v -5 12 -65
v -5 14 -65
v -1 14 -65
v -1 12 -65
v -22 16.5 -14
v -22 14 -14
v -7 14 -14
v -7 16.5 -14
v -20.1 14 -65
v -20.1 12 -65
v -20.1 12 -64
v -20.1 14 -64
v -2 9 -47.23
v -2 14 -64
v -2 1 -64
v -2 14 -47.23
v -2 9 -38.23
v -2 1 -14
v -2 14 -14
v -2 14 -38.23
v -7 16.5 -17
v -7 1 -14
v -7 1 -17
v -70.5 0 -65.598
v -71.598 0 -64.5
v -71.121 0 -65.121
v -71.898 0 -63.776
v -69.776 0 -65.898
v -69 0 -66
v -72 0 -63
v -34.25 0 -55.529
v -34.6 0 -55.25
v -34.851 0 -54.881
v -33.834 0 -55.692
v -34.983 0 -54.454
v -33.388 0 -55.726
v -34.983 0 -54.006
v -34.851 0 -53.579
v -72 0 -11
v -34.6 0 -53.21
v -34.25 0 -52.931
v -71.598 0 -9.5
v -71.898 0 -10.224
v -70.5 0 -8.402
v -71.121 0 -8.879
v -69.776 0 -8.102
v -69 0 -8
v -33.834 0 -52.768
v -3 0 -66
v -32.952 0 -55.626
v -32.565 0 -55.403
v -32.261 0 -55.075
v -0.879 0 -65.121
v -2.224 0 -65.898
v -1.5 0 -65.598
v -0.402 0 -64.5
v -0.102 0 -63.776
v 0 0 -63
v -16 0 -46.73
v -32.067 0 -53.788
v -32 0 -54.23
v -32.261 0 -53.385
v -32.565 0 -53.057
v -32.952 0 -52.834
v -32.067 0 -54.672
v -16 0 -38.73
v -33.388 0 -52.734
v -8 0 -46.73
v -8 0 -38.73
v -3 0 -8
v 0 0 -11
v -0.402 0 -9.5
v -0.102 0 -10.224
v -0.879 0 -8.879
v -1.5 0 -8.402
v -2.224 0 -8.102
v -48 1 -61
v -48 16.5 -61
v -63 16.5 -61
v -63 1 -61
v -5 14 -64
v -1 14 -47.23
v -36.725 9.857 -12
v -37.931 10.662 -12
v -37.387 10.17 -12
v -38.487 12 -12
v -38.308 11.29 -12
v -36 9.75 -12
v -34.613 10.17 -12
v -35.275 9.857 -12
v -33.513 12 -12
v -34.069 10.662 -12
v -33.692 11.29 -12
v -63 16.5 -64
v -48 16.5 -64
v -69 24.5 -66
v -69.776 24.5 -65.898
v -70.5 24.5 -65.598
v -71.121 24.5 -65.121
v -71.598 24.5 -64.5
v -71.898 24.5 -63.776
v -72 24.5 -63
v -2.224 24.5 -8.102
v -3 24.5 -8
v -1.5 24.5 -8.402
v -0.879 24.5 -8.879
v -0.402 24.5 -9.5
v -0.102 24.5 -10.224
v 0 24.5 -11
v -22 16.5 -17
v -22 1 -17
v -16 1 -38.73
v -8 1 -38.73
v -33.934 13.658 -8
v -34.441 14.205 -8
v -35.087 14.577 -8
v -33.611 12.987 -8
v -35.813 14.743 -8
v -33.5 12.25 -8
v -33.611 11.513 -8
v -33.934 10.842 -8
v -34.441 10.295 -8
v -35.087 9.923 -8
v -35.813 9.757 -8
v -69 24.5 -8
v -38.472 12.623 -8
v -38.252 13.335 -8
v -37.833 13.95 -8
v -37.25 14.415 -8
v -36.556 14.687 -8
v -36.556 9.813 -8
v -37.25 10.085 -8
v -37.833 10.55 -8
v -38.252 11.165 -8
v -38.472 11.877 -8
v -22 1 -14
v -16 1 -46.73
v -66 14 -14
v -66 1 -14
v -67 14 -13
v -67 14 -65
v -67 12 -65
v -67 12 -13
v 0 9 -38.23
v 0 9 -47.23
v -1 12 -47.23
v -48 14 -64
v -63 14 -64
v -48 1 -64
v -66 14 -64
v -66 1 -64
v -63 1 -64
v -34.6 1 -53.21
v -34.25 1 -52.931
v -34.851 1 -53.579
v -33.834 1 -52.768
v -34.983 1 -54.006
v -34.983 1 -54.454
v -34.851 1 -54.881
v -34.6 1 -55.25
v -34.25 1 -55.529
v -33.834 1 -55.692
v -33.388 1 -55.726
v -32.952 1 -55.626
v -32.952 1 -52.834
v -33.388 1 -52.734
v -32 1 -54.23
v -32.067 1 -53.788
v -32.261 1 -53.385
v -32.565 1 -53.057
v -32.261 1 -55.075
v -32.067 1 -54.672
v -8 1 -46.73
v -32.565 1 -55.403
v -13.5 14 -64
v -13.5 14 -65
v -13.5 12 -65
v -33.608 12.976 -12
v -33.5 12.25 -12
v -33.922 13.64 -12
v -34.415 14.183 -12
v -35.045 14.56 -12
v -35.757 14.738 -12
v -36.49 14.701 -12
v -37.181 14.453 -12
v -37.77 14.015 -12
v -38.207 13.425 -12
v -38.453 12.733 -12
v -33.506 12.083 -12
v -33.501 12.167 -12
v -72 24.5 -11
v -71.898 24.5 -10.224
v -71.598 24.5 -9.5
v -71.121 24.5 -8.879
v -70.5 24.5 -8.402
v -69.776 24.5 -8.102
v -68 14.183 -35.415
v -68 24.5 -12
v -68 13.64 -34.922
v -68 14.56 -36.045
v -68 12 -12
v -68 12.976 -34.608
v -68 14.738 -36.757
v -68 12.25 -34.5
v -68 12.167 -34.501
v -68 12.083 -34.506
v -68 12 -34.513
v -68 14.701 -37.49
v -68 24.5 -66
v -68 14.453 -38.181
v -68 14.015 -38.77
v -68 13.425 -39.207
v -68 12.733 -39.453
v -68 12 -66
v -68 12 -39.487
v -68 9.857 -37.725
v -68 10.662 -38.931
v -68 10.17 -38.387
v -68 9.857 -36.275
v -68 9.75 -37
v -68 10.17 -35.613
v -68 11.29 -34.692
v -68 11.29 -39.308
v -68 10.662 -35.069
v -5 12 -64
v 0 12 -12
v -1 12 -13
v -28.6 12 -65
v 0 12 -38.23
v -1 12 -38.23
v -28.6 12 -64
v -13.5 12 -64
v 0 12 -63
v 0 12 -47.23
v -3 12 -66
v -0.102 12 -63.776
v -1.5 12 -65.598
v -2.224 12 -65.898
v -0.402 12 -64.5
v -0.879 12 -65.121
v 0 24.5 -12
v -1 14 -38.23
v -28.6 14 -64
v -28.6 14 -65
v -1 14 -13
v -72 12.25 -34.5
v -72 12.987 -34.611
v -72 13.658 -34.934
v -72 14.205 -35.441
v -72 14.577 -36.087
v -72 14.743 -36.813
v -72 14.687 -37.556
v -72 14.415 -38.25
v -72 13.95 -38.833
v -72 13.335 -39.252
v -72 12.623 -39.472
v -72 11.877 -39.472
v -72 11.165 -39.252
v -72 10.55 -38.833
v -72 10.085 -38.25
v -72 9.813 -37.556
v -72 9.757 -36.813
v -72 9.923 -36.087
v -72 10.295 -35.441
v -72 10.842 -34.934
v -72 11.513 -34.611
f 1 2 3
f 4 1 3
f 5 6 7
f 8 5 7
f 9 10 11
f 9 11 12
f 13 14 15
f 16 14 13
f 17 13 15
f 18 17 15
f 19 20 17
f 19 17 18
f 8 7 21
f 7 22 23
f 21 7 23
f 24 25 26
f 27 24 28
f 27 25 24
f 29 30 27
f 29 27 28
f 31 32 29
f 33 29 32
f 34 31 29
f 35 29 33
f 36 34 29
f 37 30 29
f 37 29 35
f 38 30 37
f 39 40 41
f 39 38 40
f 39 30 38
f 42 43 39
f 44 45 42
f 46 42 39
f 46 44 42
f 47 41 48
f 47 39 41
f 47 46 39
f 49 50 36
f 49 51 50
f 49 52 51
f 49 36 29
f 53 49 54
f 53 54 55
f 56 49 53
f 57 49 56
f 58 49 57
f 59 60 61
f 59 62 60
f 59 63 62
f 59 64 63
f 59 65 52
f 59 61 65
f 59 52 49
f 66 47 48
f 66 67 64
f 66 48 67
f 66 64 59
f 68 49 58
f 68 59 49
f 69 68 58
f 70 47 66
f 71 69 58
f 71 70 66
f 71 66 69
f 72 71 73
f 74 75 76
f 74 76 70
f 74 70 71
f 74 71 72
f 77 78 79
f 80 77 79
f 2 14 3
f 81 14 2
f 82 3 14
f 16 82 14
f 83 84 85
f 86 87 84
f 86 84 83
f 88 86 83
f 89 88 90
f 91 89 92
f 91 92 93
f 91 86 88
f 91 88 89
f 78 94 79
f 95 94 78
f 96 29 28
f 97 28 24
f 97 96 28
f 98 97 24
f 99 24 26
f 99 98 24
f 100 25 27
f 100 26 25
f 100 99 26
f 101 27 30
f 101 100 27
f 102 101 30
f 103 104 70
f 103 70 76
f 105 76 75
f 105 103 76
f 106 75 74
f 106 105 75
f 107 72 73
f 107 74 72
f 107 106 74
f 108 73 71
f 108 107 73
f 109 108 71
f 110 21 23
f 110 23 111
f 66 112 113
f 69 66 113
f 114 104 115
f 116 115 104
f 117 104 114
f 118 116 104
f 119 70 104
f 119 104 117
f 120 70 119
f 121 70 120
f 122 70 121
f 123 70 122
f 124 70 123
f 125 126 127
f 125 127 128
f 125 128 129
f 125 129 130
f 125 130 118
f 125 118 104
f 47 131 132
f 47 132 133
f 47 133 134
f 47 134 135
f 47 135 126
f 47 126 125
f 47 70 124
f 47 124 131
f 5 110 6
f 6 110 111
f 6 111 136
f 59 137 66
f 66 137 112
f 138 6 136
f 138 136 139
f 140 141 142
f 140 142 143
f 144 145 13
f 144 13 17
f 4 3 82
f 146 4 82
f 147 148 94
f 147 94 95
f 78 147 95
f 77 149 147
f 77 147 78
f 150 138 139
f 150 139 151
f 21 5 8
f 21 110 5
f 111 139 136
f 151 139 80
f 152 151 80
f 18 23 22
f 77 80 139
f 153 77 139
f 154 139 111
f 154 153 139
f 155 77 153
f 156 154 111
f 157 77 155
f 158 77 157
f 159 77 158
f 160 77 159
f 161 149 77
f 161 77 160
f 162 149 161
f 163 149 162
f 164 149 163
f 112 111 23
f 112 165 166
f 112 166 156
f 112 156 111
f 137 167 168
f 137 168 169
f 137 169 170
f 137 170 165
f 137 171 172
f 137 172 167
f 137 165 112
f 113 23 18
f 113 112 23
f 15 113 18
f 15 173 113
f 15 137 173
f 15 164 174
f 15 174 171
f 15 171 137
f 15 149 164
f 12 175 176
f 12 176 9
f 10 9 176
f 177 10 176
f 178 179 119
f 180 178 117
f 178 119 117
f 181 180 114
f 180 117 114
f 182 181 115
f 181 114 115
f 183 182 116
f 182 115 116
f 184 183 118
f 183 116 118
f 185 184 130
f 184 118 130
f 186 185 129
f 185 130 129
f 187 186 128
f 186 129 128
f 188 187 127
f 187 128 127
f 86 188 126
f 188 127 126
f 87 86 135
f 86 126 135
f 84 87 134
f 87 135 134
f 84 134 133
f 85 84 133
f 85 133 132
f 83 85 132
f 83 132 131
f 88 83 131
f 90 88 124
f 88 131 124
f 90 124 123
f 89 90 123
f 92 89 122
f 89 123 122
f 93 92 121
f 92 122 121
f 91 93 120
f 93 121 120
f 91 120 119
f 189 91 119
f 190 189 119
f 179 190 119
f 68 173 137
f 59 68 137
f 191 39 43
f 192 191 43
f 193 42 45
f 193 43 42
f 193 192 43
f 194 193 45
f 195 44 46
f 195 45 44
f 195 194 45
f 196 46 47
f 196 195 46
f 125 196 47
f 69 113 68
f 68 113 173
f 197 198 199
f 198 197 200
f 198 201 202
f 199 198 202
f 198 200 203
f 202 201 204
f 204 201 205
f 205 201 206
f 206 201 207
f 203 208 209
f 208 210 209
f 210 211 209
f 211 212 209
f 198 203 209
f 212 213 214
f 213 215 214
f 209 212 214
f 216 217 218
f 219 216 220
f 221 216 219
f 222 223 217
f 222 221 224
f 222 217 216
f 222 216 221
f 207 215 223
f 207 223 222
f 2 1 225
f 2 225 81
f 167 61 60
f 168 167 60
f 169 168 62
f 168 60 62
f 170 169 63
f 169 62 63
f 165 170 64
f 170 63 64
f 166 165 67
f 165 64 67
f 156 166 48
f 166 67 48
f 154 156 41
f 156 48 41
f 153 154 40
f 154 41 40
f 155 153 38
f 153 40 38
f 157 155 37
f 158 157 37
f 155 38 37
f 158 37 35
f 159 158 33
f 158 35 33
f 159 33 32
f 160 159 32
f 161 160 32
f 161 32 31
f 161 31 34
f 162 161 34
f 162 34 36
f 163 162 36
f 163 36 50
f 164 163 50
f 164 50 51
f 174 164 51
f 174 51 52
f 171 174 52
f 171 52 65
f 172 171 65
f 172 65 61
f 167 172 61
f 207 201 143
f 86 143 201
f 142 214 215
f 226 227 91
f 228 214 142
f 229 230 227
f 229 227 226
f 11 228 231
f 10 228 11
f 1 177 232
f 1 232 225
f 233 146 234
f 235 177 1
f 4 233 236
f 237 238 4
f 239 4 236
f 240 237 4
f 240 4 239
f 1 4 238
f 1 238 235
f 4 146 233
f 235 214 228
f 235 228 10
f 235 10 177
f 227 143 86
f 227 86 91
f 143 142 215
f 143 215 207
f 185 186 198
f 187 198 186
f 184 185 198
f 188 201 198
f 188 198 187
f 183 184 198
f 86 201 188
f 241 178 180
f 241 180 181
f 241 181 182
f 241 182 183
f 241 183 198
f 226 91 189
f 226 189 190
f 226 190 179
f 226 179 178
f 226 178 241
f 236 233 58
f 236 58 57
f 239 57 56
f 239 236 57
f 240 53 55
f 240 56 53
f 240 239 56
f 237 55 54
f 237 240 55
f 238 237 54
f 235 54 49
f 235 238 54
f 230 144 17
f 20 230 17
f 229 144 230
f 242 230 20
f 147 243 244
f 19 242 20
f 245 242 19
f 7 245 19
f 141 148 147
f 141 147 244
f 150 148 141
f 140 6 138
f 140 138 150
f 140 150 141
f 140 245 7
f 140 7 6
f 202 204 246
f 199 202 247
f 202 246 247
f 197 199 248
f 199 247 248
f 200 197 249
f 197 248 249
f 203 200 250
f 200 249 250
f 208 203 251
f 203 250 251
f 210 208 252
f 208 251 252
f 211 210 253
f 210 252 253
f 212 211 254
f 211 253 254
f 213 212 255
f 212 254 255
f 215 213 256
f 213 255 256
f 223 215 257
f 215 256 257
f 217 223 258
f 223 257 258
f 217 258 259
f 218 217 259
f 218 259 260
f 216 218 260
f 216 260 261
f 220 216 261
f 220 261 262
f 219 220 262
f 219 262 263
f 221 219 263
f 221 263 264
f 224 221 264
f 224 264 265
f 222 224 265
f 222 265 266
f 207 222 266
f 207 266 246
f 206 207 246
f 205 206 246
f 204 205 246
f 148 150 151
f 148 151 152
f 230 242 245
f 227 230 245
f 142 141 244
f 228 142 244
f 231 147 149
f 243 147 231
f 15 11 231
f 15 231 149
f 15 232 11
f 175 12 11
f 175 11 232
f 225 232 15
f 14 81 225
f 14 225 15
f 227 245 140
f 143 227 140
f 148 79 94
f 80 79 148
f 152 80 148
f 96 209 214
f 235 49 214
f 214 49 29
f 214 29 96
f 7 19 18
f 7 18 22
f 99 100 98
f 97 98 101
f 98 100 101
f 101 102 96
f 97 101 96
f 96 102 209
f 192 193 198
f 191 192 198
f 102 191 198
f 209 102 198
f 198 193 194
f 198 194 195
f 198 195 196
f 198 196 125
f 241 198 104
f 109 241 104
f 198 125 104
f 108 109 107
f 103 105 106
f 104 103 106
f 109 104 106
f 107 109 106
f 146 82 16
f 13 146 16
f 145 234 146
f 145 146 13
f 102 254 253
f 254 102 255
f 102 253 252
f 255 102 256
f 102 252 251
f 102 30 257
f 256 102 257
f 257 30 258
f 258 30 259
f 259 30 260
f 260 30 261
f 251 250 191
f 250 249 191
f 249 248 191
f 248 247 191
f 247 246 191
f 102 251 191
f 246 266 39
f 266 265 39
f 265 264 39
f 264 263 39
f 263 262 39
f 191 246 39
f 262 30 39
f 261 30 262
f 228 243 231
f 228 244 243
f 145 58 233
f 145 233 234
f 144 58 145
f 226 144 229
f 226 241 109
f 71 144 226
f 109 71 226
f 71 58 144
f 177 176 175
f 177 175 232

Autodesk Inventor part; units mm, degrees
ref_plane "YZ Plane" through (0, 0, 0) normal (1, 0, 0) x (0, 1, 0)
ref_plane "XZ Plane" through (0, 0, 0) normal (0, 1, 0) x (-1, 0, 0)
ref_plane "XY Plane" through (0, 0, 0) normal (0, 0, 1) x (1, 0, 0)
sketch "Sketch1" plane through (0, 0, 0) normal (0, 1, 0) x (-1, 0, 0)
  point P0 (0, 0)
sketch "Sketch2" plane through (0, 0, 0) normal (0, 1, 0) x (-1, 0, 0)
  line L0 (68, -12) -> (68, -66)
  line L1 (68, -66) -> (0, -66)
  line L2 (0, -66) -> (0, -12)
  line L3 (68, -12) -> (0, -12)
  point P0 (0, 0)
  dimension "d0" = 68
  dimension "d138" = 54
extrude "Extrusion1" add sketch "Sketch2" along normal blind 14
sketch "Sketch3" plane through (0, 14, 0) normal (0, 1, 0) x (1, 0, 0)
  point P0 (-68, 66)
sketch "Sketch4" plane through (0, 14, 0) normal (0, 1, 0) x (1, 0, 0)
  line L0 (0, 66) -> (-68, 66) projected
  line L1 (-30.4814, 66) -> (-28.4814, 66)
  line L2 (-28.4814, 66) -> (-28.4814, 64)
  line L3 (-68, 66) -> (-68, 12) projected
  line L4 (-68, 37.8423) -> (-68, 39.8423)
  line L5 (-68, 39.8423) -> (-66, 39.8423)
  line L6 (0, 38.8423) -> (0, 36.8423)
  line L7 (0, 36.8423) -> (-2, 36.8423)
  line L8 (-66, 64) -> (-2, 64)
  line L9 (-2, 64) -> (-2, 14)
  line L10 (-2, 14) -> (-66, 14)
  line L11 (-66, 14) -> (-66, 64)
  dimension "d5" = 2
  dimension "d6" = 2
  dimension "d7" = 2
  dimension "d11" = 2
  dimension "d75" = 2
  dimension "d132" = 50
  dimension "d133" = 64
extrude "Extrusion2" cut sketch "Sketch4" against normal blind 13 contours L8 L9 L10 L11
sketch "Sketch7" plane through (0, 14, 0) normal (0, 1, 0) x (1, 0, 0)
  line L0 (-68, 66) -> (-67, 66)
  line L1 (-68, 66) -> (-6, 66)
  line L2 (-68, 65) -> (-68, 66)
  line L3 (0, 66) -> (-7, 66)
  line L4 (-67, 65) -> (-1, 65)
  line L5 (0, 66) -> (-68, 66) projected
  line L6 (-68, 66) -> (0, 66)
  line L7 (0, 12) -> (0, 66) projected
  line L8 (0, 12) -> (-1, 12)
  line L9 (-1, 66) -> (0, 66)
  line L10 (0, 66) -> (0, 12)
  line L11 (0, 12) -> (-1, 12)
  line L12 (-68, 12) -> (0, 12) projected
  line L13 (-1, 65) -> (-1, 12)
  line L14 (0, 12) -> (-1, 12)
  line L15 (-67, 65) -> (-67, 12)
  line L16 (-68, 66) -> (-68, 12) projected
  line L17 (-67, 12) -> (-68, 12)
  line L18 (-68, 12) -> (-68, 66)
  dimension "d76" = 1
  dimension "d139" = 1
  dimension "d140" = 1
extrude "Extrusion3" cut sketch "Sketch7" against normal blind 2 contours L0 L1 L3 L7 L8 L13 L4 L15 L12 L16 L2
sketch "Sketch8" plane through (0, 14, 0) normal (0, 1, 0) x (1, 0, 0)
  line L0 (0, 12) -> (0, 13)
  line L1 (0, 13) -> (-68, 13)
  line L2 (0, 12) -> (-68, 12)
  line L3 (-68, 12) -> (-68, 13)
  line L4 (-67, 12) -> (-1, 12) projected
  point P0 (0, 0)
  point P1 (-70, 0)
  dimension "d46" = 68
  dimension "d141" = 1
extrude "Extrusion4" cut sketch "Sketch8" against normal blind 2
sketch "Sketch10" plane through (0, 1, 0) normal (0, 1, 0) x (1, 0, 0)
  line L0 (-31, 2) -> (-41, 2)
  line L1 (-63, 64) -> (-48, 64)
  line L2 (-48, 64) -> (-48, 61)
  line L3 (-48, 61) -> (-63, 61)
  line L4 (-63, 61) -> (-63, 64)
  line L5 (-22, 14) -> (-7, 14)
  line L6 (-7, 14) -> (-7, 17)
  line L7 (-7, 17) -> (-22, 17)
  line L8 (-22, 17) -> (-22, 14)
  line L9 (-66, 14) -> (-66, 64) projected
  line L10 (-2, 14) -> (-66, 14) projected
  line L11 (-66, 64) -> (-2, 64)
  line L12 (-2, 64) -> (-2, 14)
  line L13 (-2, 14) -> (-66, 14)
  line L14 (-66, 14) -> (-66, 64)
  point P0 (0, 0)
  point P1 (-21, 64)
  dimension "d57" = 15
  dimension "d58" = 3
  dimension "d61" = 15
  dimension "d79" = 3
extrude "Extrusion5" add sketch "Sketch10" along normal blind 15.5 contours L1 L2 L3 L4 | L8 L7 L6 L5
sketch "Sketch11" plane through (0, 0, 0) normal (0, -1, 0) x (1, 0, 0)
  circle A0 centre (-12, -42.73) radius 4
  circle A1 centre (-33.5, -54.23) radius 1.5
  line L0 (0, 0) -> (0, -66) projected
  line L1 (0, -66) -> (-68, -66) projected
  line L2 (-2, -64) -> (-2, -14) projected
  dimension "d85" = 23.27
  dimension "d86" = 21.5
  dimension "d88" = 8
  dimension "d89" = 3
  dimension "d119" = 11.5
  dimension "d120" = 10
extrude "Extrusion6" cut sketch "Sketch11" against normal blind 9
sketch "Sketch12" plane through (0, 0, 0) normal (0, -1, 0) x (1, 0, 0)
  line L0 (-68, -12) -> (-68, -66) projected
  line L1 (0, -12) -> (0, -8)
  line L2 (0, -8) -> (-68, -8)
  line L3 (-68, -12) -> (0, -12)
  line L4 (0, -12) -> (-68, -12) projected
  line L5 (-68, -66) -> (-68, -12) projected
  line L6 (-68, -66) -> (-72, -66)
  line L7 (-68, -12) -> (-68, -66)
  line L8 (-72, -66) -> (-72, -12)
  line L9 (-68, -8) -> (-72, -8)
  line L10 (-72, -8) -> (-72, -12.2471)
  point P0 (0, 0)
  point P1 (-70, 0)
  dimension "d81" = 4
  dimension "d144" = 0
extrude "Extrusion7" add sketch "Sketch12" against normal blind 24.5
sketch "Sketch15" plane through (0, 0, -66) normal (1, 0, 0) x (0, 0, -1)
  line L0 (-27.77, 14) -> (-18.77, 14)
  line L1 (-18.77, 14) -> (-18.77, 9)
  line L2 (-18.77, 9) -> (-27.77, 9)
  line L3 (-27.77, 9) -> (-27.77, 14)
  line L4 (-54, 0) -> (-54, 24.5) projected
  line L5 (0, 0) -> (0, 12) projected
  line L6 (0, 0) -> (-58, 0) projected
  line L7 (0, 12) -> (-54, 12) projected
  line L8 (-23.27, -7.8454) -> (-23.27, 0)
  line L9 (-23.27, 0) -> (-23.27, 12)
  line L10 (-53, 14) -> (-1, 14) projected
  point P0 (-66, 0)
  point P1 (-66, 14.75)
  point P2 (0, 16.75)
  point P3 (-1, 14)
  dimension "d108" = 9
  dimension "d109" = 5
  dimension "d111" = 27.77
  dimension "d174" = 0
extrude "Extrusion9" cut sketch "Sketch15" against normal blind 10 contours L0 L1 L7 L3 | L7 L9 L2 L3 | L1 L2 L9 L7
fillet "Fillet7" radius 3 1 edges at (0, 6, -66)
fillet "Fillet9" radius 3 1 edges at (0, 12.25, -8)
sketch "Sketch17" plane through (-3, 0, -66) normal (0, 0, -1) x (-1, 0, 0)
  line L0 (2, 17) -> (10.5, 17)
  line L1 (10.5, 17) -> (10.5, 12)
  line L2 (10.5, 12) -> (2, 12)
  line L3 (2, 12) -> (2, 17)
  line L4 (17.1, 17) -> (25.6, 17)
  line L5 (25.6, 17) -> (25.6, 12)
  line L6 (25.6, 12) -> (17.1, 12)
  line L7 (17.1, 12) -> (17.1, 17)
  line L8 (66, 0) -> (66, 10.5) projected
  line L9 (-2, 14) -> (64, 14) projected
  line L10 (65, 12) -> (0, 12) projected
  line L11 (-3, 12) -> (-3, 0) projected
  point P0 (64, 10.5)
  point P1 (0, 12)
  dimension "d151" = 8.5
  dimension "d152" = 8.5
  dimension "d153" = 5
  dimension "d157" = 0
  dimension "d158" = 13.5
  dimension "d160" = 28.6
extrude "Extrusion11" cut sketch "Sketch17" against normal blind 10 contours L0 L1 L9 L3 | L9 L1 L2 L3 | L9 L5 L6 L7 | L7 L4 L5 L9
sketch "Sketch18" plane through (0, 1, 0) normal (0, 1, 0) x (1, 0, 0)
  circle A0 centre (-12, 42.73) radius 4 projected
  line L0 (-12, 38.73) -> (-8, 38.73)
  line L1 (-8, 38.73) -> (-8, 46.73)
  line L2 (-8, 46.73) -> (-16, 46.73)
  line L3 (-16, 46.73) -> (-16, 38.73)
  line L4 (-16, 38.73) -> (-12, 38.73)
  point P0 (0, 0)
  dimension "d169" = 4
  dimension "d170" = 8
  dimension "d171" = 8
extrude "Extrusion12" cut sketch "Sketch18" against normal blind 1
sketch "Sketch19" plane through (-72, 0, -8) normal (0, 0, 1) x (1, 0, 0)
  line L0 (0, 24.5) -> (69, 24.5) projected
  line L1 (69, 0) -> (0, 0) projected
  line L2 (0, 24.5) -> (0, 0)
  line L3 (0, 0) -> (0, 24.5) projected
  line L4 (0, 12.25) -> (70, 12.25)
  line L5 (4, 12) -> (69, 12) projected
  line L6 (72, 12) -> (72, 0) projected
  line L7 (0, 0) -> (72, 0)
  line L8 (0, 4.6147) -> (36, 4.6147)
  line L9 (36, 4.6147) -> (36, 24.5)
  line L10 (72, 24.5) -> (4, 24.5) projected
  circle A0 centre (36, 12.25) radius 2.5
  dimension "d177" = 36
  dimension "d178" = 5
extrude "Extrusion13" cut sketch "Sketch19" against normal blind 4 contours A0 L9 L4 | L4 L9 L5 A0 | A0 L4 L9 | L4 A0 L5 L9 | L5 L9 A0 | L9 L5 A0
sketch "Sketch20" plane through (-72, 0, -66) normal (-1, 0, 0) x (0, 0, 1)
  line L0 (0, 0) -> (0, 24.5) projected
  line L1 (0, 12.25) -> (58, 12.25)
  line L2 (58, 24.5) -> (58, 0) projected
  line L3 (3, 0) -> (55, 0) projected
  line L4 (29, 0) -> (29, 24.5)
  line L5 (54, 24.5) -> (0, 24.5) projected
  circle A0 centre (29, 12.25) radius 2.5
  point P0 (66, 0)
  dimension "d181" = 5
extrude "Extrusion14" cut sketch "Sketch20" against normal blind 4 contours A0 L4 L1 | L1 L4 A0 | L4 A0 L1 | L1 A0 L4
fillet "Fillet12" radius 3 1 edges at (-72, 12.25, -8)
fillet "Fillet13" radius 3 1 edges at (-72, 12.25, -66)
properties part number "Shell 5 top"
